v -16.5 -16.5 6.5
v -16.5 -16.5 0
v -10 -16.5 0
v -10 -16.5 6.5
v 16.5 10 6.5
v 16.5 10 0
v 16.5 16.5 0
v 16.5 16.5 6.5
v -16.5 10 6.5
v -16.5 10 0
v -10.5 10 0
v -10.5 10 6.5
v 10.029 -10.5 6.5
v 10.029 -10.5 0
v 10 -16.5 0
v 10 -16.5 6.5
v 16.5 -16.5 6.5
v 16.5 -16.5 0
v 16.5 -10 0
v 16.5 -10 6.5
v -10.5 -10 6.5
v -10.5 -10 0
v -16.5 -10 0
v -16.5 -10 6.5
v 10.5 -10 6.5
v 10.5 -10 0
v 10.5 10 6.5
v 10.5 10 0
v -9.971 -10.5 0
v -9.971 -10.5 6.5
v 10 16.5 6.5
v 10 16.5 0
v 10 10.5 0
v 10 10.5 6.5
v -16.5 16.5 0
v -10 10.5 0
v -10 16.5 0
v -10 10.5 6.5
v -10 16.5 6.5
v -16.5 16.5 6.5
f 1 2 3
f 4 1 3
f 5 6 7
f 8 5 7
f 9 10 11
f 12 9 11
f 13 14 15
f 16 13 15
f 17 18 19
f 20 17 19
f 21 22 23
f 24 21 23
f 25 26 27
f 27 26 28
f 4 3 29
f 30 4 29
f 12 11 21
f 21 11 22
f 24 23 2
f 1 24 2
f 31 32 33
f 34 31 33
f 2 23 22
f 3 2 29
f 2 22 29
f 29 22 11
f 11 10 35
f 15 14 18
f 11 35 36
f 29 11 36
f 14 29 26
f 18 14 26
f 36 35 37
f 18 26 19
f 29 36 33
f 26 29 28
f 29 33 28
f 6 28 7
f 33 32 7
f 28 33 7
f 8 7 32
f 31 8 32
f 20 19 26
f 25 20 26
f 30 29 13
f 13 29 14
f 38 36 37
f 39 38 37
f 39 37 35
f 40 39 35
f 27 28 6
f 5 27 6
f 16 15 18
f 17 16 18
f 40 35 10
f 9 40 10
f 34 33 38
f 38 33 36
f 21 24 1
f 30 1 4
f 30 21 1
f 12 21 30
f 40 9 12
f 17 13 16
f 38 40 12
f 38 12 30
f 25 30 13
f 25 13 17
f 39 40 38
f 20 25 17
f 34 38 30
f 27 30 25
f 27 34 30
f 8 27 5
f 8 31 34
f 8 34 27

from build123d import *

# Parameters (mm, degrees)
F1_DEPTH = 6.5


with BuildPart() as f1:
    # F0 (on Top) → F1 (new body)
    with BuildSketch(Plane.XY):
        Polygon((-10, 16.5), (-16.5, 16.5), (-16.5, 10), (-10.5, 10), (-10.5, -10), (-16.5, -10), (-16.5, -16.5), (-10, -16.5), (-9.971203, -10.500069), (10.028797, -10.500069), (10, -16.5), (16.5, -16.5), (16.5, -10), (10.5, -10), (10.5, 10), (16.5, 10), (16.5, 16.5), (10, 16.5), (10, 10.5), (-10, 10.5), align=None)
    extrude(amount=F1_DEPTH)


solid = f1.part
